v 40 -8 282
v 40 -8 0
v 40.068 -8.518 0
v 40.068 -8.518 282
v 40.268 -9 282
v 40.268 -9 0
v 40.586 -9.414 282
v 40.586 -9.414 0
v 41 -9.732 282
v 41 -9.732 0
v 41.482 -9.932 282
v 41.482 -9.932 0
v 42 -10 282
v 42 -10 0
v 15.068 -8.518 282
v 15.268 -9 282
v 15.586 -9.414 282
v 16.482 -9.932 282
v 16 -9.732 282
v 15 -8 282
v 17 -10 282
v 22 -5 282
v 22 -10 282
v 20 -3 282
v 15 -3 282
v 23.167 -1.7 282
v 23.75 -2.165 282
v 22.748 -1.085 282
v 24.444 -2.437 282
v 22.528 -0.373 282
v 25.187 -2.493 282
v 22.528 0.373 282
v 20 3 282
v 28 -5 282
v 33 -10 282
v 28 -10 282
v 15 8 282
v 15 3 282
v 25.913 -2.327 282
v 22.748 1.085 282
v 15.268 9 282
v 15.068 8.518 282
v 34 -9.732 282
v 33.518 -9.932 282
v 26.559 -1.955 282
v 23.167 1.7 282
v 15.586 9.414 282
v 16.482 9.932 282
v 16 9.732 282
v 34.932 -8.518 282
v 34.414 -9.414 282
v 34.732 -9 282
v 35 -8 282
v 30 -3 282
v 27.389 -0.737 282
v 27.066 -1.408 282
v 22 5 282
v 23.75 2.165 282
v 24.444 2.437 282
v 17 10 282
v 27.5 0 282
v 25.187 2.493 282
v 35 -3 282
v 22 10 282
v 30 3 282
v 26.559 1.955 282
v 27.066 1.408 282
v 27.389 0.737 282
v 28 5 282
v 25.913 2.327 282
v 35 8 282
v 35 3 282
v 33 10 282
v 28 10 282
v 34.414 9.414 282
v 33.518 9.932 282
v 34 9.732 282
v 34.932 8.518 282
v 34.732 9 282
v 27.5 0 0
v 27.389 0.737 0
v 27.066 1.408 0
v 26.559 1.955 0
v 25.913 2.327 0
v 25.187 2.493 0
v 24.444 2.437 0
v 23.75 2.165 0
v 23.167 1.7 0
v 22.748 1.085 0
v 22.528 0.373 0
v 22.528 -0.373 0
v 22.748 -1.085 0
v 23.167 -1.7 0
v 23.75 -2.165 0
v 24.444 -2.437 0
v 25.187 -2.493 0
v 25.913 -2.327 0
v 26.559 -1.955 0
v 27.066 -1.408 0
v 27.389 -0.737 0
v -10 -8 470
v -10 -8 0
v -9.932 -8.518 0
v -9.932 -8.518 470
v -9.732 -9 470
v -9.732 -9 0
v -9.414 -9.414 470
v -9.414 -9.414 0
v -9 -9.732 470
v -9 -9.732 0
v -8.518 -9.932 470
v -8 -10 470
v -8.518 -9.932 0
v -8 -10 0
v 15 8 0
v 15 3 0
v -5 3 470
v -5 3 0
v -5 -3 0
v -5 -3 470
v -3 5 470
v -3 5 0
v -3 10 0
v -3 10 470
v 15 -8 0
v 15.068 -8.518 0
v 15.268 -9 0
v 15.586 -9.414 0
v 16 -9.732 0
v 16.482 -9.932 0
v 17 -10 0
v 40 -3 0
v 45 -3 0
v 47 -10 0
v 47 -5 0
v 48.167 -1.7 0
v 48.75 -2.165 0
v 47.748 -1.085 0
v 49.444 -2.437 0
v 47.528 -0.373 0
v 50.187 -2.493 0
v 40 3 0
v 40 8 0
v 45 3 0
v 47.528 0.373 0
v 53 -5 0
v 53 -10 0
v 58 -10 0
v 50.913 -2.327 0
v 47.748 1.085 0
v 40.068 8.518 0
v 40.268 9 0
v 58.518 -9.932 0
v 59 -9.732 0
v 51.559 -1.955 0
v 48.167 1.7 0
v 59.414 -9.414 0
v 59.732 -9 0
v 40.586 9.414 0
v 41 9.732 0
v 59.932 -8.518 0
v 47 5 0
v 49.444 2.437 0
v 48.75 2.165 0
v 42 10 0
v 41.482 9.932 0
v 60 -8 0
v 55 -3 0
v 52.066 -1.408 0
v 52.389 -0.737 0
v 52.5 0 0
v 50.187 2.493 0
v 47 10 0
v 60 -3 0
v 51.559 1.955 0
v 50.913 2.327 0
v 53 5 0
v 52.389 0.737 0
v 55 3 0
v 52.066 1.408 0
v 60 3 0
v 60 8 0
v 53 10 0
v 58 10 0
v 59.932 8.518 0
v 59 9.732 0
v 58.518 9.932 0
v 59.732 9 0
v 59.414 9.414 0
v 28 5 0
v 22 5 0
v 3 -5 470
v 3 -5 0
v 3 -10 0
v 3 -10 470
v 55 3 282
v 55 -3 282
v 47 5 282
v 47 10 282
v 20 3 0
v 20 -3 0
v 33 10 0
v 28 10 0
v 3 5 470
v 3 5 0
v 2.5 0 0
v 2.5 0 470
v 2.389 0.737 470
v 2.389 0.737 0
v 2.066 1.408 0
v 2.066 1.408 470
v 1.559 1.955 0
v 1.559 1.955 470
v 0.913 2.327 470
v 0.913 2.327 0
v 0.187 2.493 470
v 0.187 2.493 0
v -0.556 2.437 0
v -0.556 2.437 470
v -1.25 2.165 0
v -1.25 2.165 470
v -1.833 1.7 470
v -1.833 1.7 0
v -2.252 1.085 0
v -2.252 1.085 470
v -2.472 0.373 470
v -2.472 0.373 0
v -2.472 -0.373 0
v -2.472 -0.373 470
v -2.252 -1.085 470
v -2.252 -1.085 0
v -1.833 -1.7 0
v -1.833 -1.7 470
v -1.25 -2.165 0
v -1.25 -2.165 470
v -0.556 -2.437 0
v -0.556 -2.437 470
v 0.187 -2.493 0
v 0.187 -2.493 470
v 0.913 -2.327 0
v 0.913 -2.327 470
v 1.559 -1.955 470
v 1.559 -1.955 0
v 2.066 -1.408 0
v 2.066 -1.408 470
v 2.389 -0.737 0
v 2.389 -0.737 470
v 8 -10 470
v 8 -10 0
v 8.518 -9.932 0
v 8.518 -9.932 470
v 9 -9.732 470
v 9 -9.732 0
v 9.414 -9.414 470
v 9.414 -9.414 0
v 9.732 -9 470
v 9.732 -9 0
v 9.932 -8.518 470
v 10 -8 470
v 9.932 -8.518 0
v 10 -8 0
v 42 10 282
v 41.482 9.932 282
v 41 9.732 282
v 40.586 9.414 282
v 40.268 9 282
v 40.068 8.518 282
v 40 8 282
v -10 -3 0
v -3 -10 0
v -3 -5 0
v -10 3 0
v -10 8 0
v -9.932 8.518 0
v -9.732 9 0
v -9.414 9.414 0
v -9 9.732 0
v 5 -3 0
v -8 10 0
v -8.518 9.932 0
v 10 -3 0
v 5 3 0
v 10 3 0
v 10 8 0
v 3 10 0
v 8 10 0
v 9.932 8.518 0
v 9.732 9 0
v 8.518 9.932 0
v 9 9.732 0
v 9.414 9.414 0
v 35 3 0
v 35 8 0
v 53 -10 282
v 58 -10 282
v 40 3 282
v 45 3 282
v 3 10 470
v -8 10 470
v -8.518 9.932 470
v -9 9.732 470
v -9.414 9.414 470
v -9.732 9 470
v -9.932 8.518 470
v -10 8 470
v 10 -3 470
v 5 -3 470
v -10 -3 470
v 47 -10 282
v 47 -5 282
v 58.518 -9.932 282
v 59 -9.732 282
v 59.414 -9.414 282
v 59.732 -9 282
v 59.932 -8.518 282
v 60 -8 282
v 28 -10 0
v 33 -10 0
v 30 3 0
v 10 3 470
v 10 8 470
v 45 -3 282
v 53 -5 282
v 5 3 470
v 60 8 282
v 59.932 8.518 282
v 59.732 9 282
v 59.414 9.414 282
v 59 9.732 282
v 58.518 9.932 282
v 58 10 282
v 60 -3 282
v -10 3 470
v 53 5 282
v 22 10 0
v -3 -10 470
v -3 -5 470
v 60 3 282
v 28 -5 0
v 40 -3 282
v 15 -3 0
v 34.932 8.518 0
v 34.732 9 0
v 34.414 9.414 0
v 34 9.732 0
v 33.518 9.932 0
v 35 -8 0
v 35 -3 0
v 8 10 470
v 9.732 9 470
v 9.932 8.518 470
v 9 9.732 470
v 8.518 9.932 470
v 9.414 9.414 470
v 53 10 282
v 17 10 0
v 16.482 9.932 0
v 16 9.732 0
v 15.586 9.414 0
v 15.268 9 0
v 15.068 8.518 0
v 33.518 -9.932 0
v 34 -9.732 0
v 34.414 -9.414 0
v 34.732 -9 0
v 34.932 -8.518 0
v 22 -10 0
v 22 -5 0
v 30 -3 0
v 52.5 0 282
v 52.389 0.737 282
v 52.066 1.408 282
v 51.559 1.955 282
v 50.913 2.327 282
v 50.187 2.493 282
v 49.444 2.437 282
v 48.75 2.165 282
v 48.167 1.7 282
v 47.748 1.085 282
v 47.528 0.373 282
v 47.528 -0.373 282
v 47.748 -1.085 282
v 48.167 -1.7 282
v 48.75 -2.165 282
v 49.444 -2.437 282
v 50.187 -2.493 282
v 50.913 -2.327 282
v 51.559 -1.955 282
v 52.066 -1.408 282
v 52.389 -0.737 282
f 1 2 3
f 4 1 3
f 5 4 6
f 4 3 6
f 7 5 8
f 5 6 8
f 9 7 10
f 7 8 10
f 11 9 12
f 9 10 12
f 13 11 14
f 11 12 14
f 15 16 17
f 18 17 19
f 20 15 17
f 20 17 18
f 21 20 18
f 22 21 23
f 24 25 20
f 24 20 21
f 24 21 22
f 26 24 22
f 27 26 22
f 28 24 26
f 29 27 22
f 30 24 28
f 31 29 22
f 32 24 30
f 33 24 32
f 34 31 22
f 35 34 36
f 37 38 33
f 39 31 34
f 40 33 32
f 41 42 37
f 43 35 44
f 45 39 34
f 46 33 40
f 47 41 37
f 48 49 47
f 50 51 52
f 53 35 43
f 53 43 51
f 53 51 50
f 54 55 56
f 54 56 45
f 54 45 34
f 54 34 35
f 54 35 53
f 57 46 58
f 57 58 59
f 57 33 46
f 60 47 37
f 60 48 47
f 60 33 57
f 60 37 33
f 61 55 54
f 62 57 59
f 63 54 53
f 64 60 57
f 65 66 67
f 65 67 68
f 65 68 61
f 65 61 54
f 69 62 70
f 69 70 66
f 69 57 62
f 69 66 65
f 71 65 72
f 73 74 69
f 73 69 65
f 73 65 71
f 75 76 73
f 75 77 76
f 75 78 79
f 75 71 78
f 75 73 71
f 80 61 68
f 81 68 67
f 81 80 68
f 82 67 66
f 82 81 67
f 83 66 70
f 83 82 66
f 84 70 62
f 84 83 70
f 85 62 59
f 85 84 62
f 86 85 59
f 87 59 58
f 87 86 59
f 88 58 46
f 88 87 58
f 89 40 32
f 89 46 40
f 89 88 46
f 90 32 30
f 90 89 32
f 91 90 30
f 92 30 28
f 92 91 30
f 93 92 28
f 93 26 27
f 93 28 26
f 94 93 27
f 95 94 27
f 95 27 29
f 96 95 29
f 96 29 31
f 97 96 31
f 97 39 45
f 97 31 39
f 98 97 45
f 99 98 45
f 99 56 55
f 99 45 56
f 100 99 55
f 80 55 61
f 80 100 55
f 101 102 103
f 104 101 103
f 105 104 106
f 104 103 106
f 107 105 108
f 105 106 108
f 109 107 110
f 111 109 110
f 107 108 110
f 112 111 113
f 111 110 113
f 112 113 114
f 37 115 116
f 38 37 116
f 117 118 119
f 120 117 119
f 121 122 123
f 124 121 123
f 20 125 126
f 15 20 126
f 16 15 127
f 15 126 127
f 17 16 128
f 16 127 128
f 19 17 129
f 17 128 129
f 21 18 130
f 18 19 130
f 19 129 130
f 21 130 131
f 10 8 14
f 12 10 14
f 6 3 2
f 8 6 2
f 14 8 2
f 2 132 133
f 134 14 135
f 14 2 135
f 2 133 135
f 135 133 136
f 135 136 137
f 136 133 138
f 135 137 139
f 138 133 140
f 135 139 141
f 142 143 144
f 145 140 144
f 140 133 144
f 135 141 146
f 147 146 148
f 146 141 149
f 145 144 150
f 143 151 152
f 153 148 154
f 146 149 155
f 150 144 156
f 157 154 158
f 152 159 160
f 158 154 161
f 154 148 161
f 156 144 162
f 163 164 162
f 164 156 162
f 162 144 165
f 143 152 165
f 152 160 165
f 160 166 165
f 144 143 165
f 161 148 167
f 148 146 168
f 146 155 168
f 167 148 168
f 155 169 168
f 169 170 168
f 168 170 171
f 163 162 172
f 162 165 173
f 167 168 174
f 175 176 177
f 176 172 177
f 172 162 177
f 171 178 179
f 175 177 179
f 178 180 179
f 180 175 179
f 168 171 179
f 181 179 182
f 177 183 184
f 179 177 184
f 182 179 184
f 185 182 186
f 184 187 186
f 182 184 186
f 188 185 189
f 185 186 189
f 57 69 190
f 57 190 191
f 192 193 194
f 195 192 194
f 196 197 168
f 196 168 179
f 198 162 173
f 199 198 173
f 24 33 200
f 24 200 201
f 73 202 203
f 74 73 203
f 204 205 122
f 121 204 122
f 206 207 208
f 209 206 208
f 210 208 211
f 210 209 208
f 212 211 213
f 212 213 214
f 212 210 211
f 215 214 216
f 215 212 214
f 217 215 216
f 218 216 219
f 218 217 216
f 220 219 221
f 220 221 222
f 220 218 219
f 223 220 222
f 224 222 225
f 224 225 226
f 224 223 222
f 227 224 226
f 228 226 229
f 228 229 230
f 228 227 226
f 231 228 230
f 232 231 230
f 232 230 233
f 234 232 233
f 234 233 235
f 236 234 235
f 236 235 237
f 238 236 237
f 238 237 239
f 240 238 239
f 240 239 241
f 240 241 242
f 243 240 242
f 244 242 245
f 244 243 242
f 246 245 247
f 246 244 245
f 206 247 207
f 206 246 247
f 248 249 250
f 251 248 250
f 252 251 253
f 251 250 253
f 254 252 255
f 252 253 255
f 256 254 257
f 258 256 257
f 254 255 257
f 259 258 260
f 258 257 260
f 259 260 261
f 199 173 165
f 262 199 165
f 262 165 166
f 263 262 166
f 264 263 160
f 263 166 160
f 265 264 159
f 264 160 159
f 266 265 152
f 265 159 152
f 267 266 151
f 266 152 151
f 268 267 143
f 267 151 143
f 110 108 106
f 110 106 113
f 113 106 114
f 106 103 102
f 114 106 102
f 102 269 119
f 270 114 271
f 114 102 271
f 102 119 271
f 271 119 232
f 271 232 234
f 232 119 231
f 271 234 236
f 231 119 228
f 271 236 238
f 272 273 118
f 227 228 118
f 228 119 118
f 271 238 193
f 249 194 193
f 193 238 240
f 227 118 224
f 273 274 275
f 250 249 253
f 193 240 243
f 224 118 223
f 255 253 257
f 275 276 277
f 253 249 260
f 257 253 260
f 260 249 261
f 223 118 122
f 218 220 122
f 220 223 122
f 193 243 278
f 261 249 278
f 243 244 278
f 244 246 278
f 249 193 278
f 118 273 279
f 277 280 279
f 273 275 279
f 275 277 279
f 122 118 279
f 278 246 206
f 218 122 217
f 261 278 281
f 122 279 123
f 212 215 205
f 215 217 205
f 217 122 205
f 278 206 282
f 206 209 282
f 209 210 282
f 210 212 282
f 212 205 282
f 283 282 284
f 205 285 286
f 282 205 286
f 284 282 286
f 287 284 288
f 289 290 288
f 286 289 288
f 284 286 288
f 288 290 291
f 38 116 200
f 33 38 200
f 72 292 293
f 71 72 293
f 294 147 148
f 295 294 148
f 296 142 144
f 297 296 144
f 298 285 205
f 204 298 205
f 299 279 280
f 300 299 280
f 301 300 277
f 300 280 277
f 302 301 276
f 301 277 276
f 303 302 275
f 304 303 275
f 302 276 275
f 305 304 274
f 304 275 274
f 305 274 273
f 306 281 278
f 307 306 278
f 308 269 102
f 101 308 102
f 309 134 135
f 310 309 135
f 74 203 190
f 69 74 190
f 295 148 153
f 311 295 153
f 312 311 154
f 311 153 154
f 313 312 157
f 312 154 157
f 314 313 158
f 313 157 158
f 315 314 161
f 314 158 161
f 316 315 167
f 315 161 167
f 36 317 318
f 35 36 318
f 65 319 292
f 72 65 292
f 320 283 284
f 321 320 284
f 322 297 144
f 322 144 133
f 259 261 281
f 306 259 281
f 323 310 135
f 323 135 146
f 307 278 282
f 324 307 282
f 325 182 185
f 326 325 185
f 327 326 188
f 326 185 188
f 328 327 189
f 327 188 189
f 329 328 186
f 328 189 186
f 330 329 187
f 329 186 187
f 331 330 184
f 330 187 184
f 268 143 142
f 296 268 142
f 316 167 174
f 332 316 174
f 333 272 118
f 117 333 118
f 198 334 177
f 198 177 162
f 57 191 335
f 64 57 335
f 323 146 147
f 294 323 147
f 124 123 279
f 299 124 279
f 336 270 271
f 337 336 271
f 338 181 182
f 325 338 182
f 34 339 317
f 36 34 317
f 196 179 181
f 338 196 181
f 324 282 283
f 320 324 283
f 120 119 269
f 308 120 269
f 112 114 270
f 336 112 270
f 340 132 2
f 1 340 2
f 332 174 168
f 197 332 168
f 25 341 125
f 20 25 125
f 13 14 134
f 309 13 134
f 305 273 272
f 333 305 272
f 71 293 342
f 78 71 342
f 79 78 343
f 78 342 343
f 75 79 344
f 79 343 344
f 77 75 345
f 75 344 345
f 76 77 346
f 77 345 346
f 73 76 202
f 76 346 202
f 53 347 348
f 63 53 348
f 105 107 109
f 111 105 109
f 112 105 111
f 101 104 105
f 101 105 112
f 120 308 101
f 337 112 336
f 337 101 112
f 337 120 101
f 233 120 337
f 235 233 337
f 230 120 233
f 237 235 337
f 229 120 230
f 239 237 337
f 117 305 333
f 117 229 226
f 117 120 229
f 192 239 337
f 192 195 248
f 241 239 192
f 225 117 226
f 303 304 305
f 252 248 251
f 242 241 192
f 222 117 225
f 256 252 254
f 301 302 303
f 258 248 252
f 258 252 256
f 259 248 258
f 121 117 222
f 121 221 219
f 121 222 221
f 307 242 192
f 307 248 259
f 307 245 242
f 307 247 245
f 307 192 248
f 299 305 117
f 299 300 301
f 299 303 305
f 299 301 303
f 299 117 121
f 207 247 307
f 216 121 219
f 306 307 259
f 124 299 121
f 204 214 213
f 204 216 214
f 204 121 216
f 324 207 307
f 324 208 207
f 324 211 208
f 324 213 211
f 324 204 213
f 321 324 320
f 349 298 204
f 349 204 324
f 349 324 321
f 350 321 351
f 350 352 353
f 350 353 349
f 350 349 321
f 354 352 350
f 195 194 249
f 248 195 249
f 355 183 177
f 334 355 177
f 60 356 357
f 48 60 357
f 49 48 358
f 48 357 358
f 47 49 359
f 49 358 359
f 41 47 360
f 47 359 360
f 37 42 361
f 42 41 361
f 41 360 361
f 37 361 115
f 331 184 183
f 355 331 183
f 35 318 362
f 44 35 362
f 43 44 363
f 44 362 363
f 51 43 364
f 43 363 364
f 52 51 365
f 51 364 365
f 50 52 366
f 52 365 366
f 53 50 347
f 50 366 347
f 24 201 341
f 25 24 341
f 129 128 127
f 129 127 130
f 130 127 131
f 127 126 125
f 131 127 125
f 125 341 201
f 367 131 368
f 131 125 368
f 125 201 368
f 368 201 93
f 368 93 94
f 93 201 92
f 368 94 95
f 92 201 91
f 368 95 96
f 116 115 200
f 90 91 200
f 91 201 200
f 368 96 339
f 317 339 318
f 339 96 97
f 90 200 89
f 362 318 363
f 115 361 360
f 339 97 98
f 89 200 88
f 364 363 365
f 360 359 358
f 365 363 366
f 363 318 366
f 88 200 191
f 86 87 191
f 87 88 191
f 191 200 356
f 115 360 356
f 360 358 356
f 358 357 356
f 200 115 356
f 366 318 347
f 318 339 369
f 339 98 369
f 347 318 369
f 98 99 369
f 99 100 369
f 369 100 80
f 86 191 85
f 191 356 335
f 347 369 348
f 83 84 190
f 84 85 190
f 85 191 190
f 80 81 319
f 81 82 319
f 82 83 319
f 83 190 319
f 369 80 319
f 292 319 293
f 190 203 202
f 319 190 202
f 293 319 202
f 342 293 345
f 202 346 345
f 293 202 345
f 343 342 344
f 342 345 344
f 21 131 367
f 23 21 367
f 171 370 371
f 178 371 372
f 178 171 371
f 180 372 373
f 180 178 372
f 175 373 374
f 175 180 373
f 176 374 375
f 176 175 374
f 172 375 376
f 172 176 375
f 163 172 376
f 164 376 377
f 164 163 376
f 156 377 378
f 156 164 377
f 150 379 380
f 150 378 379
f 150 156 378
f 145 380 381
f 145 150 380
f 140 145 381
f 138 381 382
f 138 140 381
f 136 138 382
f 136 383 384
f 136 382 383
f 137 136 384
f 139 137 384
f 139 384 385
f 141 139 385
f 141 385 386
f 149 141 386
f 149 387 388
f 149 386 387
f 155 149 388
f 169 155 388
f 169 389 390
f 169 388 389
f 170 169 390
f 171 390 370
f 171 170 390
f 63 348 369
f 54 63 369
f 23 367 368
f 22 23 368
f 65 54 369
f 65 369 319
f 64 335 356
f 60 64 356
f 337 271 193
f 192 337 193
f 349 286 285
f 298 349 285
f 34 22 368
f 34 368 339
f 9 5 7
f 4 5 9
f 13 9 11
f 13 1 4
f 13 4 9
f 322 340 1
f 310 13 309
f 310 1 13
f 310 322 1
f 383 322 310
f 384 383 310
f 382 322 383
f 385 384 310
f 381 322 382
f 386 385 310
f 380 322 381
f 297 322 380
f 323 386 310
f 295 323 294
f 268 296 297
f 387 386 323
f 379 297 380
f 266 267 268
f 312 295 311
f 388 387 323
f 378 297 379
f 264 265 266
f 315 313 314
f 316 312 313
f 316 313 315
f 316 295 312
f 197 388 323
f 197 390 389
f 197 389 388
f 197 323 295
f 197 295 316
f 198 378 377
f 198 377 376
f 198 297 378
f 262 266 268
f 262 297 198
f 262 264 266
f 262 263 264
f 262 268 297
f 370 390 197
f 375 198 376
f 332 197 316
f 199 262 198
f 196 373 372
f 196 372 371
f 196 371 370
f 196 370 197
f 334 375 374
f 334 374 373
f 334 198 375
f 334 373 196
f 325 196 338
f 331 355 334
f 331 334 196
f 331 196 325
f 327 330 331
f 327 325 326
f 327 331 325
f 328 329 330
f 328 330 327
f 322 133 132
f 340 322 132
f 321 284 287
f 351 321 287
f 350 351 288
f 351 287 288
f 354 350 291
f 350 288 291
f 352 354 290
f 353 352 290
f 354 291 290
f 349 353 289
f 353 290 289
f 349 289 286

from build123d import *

# Parameters (mm, degrees)
F0_R     = 2.5
F1_DEPTH = 470
F3_DEPTH = 188
F4_W     = 24.158735
F4_H     = 25.46968
F5_DEPTH = 188


with BuildPart() as f1:
    # F0 (on Top) → F1 (new body)
    with BuildSketch(Plane.XY):
        with BuildLine():
            ThreePointArc((10, 8), (9.414214, 9.414214), (8, 10))
            Line((8, 10), (3, 10))
            Line((3, 10), (3, 5))
            Line((3, 5), (-3, 5))
            Line((-3, 5), (-3, 10))
            Line((-3, 10), (-8, 10))
            ThreePointArc((-8, 10), (-9.414214, 9.414214), (-10, 8))
            Line((-10, 8), (-10, 3))
            Line((-10, 3), (-5, 3))
            Line((-5, 3), (-5, -3))
            Line((-5, -3), (-10, -3))
            Line((-10, -3), (-10, -8))
            ThreePointArc((-10, -8), (-9.414214, -9.414214), (-8, -10))
            Line((-8, -10), (-3, -10))
            Line((-3, -10), (-3, -5))
            Line((-3, -5), (3, -5))
            Line((3, -5), (3, -10))
            Line((3, -10), (8, -10))
            ThreePointArc((8, -10), (9.414214, -9.414214), (10, -8))
            Line((10, -8), (10, -3))
            Line((10, -3), (5, -3))
            Line((5, -3), (5, 3))
            Line((5, 3), (10, 3))
            Line((10, 3), (10, 8))
        make_face()
        Circle(F0_R, mode=Mode.SUBTRACT)
        with BuildLine():
            Line((20, -3), (15, -3))
            Line((15, -3), (15, -8))
            ThreePointArc((15, -8), (15.585786, -9.414214), (17, -10))
            Line((17, -10), (22, -10))
            Line((22, -10), (22, -5))
            Line((22, -5), (28, -5))
            Line((28, -5), (28, -10))
            Line((28, -10), (33, -10))
            ThreePointArc((33, -10), (34.414214, -9.414214), (35, -8))
            Line((35, -8), (35, -3))
            Line((35, -3), (30, -3))
            Line((30, -3), (30, 3))
            Line((30, 3), (35, 3))
            Line((35, 3), (35, 8))
            ThreePointArc((35, 8), (34.414214, 9.414214), (33, 10))
            Line((33, 10), (28, 10))
            Line((28, 10), (28, 5))
            Line((28, 5), (22, 5))
            Line((22, 5), (22, 10))
            Line((22, 10), (17, 10))
            ThreePointArc((17, 10), (15.585786, 9.414214), (15, 8))
            Line((15, 8), (15, 3))
            Line((15, 3), (20, 3))
            Line((20, 3), (20, -3))
        make_face()
        with Locations((25, 0)):
            Circle(F0_R, mode=Mode.SUBTRACT)
        with BuildLine():
            Line((45, -3), (40, -3))
            Line((40, -3), (40, -8))
            ThreePointArc((40, -8), (40.585786, -9.414214), (42, -10))
            Line((42, -10), (47, -10))
            Line((47, -10), (47, -5))
            Line((47, -5), (53, -5))
            Line((53, -5), (53, -10))
            Line((53, -10), (58, -10))
            ThreePointArc((58, -10), (59.414214, -9.414214), (60, -8))
            Line((60, -8), (60, -3))
            Line((60, -3), (55, -3))
            Line((55, -3), (55, 3))
            Line((55, 3), (60, 3))
            Line((60, 3), (60, 8))
            ThreePointArc((60, 8), (59.414214, 9.414214), (58, 10))
            Line((58, 10), (53, 10))
            Line((53, 10), (53, 5))
            Line((53, 5), (47, 5))
            Line((47, 5), (47, 10))
            Line((47, 10), (42, 10))
            ThreePointArc((42, 10), (40.585786, 9.414214), (40, 8))
            Line((40, 8), (40, 3))
            Line((40, 3), (45, 3))
            Line((45, 3), (45, -3))
        make_face()
        with Locations((50, 0)):
            Circle(F0_R, mode=Mode.SUBTRACT)
    extrude(amount=F1_DEPTH)

    # F2 (on face) → F3 (cut)
    with BuildSketch(Plane.XY.offset(470)):
        Polygon((37.811764, 13.164037), (11.994491, 13.164037), (11.994491, -12.443597), (12.309452, -12.443597), (37.811764, -12.443597), align=None)
    extrude(amount=-F3_DEPTH, mode=Mode.SUBTRACT)

    # F4 (on face) → F5 (cut)
    with BuildSketch(Plane.XY.offset(470)):
        with Locations((50.190249, 1.123662)):
            Rectangle(F4_W, F4_H)
    extrude(amount=-F5_DEPTH, mode=Mode.SUBTRACT)


solid = f1.part
